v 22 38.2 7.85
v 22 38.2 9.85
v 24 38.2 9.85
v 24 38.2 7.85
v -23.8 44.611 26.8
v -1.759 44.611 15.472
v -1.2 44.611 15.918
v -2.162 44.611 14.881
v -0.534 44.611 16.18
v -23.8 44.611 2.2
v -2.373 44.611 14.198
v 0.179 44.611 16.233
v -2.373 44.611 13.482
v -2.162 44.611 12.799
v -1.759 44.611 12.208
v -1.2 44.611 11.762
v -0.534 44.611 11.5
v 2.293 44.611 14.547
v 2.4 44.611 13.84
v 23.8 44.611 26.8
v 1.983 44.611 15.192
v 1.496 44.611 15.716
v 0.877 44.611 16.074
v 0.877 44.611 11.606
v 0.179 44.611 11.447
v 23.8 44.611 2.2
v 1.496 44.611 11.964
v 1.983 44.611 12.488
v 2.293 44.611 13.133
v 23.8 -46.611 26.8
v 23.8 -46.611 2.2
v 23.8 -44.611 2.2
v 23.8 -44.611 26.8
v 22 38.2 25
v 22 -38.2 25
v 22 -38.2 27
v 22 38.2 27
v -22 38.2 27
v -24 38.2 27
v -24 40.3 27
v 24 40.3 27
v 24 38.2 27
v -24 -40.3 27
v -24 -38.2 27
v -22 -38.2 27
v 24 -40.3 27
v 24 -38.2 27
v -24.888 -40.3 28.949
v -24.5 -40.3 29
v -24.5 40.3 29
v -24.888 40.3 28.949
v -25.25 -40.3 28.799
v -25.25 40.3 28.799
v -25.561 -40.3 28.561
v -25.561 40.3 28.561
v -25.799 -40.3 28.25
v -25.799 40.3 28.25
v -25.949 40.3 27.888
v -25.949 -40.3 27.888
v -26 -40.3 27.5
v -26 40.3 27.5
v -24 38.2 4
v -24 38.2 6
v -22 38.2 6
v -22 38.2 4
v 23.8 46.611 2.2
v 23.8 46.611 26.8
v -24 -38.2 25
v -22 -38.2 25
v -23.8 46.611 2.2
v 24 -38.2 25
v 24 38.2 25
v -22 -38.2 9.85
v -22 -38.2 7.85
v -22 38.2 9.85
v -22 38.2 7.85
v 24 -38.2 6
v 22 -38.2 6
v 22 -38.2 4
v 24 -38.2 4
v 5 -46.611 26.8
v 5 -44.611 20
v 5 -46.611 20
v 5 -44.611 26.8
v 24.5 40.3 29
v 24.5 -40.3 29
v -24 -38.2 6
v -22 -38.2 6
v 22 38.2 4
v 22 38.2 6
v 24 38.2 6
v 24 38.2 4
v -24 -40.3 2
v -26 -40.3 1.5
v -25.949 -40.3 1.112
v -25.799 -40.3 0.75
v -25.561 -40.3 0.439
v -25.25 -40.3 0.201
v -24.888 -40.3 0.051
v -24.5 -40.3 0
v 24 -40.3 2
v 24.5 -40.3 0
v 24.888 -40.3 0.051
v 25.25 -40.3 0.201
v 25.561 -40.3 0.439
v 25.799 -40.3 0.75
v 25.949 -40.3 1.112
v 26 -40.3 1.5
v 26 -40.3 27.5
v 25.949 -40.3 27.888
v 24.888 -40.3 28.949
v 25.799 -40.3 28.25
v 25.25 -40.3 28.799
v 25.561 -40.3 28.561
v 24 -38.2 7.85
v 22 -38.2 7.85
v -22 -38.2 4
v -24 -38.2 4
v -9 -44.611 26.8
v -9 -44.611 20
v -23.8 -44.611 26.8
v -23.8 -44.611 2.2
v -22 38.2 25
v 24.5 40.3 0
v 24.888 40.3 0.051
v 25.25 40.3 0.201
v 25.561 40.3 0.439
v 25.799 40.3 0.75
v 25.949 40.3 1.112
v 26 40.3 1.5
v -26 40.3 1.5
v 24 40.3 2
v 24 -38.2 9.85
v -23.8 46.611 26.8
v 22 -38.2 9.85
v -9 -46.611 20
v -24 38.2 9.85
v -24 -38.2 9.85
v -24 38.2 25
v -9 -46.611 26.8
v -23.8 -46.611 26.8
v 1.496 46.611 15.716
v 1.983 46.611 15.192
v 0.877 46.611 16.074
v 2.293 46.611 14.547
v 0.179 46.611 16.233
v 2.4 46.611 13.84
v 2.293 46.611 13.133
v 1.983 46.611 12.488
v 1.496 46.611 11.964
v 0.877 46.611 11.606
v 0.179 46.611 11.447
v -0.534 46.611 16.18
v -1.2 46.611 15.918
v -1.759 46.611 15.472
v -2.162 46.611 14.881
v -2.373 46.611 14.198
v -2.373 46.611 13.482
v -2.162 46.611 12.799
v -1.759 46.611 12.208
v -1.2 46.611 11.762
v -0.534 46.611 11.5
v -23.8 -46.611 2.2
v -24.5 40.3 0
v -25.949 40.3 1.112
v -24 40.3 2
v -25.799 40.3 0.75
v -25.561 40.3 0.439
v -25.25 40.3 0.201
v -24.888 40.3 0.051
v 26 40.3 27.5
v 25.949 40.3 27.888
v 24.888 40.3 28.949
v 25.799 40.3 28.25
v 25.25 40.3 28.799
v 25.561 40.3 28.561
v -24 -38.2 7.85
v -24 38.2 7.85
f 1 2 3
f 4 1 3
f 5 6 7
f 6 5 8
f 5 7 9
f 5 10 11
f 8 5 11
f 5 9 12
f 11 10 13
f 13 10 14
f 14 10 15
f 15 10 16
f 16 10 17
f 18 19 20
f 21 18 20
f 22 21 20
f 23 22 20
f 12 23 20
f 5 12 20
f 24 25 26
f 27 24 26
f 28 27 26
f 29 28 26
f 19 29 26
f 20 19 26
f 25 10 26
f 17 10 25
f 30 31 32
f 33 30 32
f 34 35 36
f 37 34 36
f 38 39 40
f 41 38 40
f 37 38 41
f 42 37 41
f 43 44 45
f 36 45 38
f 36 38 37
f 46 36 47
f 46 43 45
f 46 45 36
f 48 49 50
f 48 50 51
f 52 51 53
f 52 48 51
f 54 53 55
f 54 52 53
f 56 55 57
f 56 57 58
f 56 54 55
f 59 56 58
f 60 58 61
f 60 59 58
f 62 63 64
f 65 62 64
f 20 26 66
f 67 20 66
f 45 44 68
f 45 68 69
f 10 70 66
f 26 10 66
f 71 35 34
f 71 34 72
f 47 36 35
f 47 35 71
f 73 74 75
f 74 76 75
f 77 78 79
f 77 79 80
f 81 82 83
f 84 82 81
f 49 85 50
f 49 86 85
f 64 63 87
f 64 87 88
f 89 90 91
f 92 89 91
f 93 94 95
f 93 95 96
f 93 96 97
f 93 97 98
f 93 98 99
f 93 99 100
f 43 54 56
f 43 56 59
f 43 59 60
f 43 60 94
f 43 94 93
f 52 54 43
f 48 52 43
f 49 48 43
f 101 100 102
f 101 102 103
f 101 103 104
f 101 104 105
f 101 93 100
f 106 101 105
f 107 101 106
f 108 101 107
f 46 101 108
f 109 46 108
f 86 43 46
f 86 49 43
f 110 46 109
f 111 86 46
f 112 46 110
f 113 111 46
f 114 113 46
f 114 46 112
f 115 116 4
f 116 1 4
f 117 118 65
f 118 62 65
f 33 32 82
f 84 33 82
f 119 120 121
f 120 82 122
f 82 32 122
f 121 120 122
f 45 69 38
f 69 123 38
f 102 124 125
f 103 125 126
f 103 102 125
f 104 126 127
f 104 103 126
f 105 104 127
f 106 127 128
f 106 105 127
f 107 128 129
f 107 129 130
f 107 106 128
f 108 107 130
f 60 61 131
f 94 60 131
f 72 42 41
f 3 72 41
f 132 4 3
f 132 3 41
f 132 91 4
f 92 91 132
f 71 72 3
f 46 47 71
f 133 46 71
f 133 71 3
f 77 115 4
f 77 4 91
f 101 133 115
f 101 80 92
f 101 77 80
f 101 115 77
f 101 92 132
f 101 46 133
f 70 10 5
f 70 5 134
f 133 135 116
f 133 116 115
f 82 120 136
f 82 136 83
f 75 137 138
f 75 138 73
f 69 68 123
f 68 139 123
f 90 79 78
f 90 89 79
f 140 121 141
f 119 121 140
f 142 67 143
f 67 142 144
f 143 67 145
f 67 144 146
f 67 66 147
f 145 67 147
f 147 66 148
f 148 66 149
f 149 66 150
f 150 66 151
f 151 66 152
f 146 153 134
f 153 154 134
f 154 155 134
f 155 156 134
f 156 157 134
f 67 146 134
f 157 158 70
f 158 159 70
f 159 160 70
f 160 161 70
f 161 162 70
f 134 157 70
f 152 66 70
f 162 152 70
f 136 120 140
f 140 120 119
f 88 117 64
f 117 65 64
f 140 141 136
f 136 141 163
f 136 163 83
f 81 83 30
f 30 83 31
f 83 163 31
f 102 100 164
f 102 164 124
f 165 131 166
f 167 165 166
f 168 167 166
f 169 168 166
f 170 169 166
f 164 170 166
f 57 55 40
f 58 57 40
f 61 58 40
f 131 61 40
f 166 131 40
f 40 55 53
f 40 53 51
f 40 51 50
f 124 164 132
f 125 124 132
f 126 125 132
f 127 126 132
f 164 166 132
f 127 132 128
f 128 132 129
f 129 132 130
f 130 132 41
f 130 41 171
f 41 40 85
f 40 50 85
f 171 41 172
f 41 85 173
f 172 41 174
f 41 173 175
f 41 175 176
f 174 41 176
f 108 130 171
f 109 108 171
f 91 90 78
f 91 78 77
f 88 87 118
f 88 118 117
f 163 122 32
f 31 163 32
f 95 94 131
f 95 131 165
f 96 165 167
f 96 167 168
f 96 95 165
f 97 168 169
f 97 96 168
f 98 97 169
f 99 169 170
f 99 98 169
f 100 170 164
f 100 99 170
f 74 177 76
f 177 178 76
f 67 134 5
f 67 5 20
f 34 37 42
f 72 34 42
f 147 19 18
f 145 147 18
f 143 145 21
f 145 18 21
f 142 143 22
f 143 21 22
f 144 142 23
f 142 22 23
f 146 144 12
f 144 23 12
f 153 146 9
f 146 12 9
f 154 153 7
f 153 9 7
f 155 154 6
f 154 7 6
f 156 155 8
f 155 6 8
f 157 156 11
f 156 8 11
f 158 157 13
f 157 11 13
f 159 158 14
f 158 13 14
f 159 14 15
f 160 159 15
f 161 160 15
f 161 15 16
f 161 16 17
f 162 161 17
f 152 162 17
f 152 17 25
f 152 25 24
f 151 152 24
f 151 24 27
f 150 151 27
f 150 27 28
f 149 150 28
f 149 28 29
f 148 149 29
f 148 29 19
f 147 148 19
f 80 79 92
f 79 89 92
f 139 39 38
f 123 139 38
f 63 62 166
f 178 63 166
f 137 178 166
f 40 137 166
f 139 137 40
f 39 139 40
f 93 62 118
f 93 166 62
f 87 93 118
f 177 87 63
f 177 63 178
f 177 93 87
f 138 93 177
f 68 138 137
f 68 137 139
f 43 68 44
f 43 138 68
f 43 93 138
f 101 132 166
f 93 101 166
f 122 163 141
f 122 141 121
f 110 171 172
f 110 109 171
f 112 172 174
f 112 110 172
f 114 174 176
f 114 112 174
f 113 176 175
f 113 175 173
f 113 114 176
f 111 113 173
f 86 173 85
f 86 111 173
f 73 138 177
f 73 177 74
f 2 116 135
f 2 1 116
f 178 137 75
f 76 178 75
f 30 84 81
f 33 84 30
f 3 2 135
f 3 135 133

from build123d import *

# Parameters (mm, degrees)
F1_DEPTH = 40.3
F0_W     = 2
F0_H     = 2
F2_DEPTH = 38.2
F4_START = 2.2
F3_W     = 23.8
F3_H     = 2
F4_DEPTH = 24.6
F5_W     = 14
F5_H     = 6.9
F6_DEPTH = 46.8
F7_START = 2.2
F7_DEPTH = 24.6
F8_R     = 2.4
F9_DEPTH = 48


with BuildPart() as f1:
    # F0 (on Front) → F1 (new body, symmetric)
    with BuildSketch(Plane.XZ):
        with BuildLine():
            Line((24.5, 29), (-24.5, 29))
            ThreePointArc((-24.5, 29), (-25.5606601718, 28.5606601718), (-26, 27.5))
            Line((-26, 27.5), (-26, 1.5))
            ThreePointArc((-26, 1.5), (-25.5606601718, 0.4393398282), (-24.5, 0))
            Line((-24.5, 0), (24.5, 0))
            ThreePointArc((24.5, 0), (25.5606601718, 0.4393398282), (26, 1.5))
            Line((26, 1.5), (26, 27.5))
            ThreePointArc((26, 27.5), (25.5606601718, 28.5606601718), (24.5, 29))
        make_face()
        Polygon((-24, 25), (-24, 27), (-22, 27), (22, 27), (24, 27), (24, 25), (24, 9.85), (24, 7.85), (24, 6), (24, 4), (24, 2), (-24, 2), (-24, 4), (-24, 6), (-24, 7.85), (-24, 9.85), align=None, mode=Mode.SUBTRACT)
    extrude(amount=F1_DEPTH, both=True)

    # F0 (on Front) → F2 (join, symmetric)
    with BuildSketch(Plane.XZ):
        with Locations((-23, 8.85)):
            Rectangle(F0_W, F0_H)
        with Locations((-23, 5)):
            Rectangle(F0_W, F0_H)
        with Locations((23, 8.85)):
            Rectangle(F0_W, F0_H)
        with Locations((23, 5)):
            Rectangle(F0_W, F0_H)
        with Locations((-23, 26)):
            Rectangle(F0_W, F0_H)
        with Locations((23, 26)):
            Rectangle(F0_W, F0_H)
    extrude(amount=F2_DEPTH, both=True)


with BuildPart() as f4:
    # F3 (on Top) → F4 (new body)
    with BuildSketch(Plane.XY.offset(F4_START)):
        with Locations((-11.9, -45.6112829745)):
            Rectangle(F3_W, F3_H)
        with Locations((11.9, -45.6112829745)):
            Rectangle(F3_W, F3_H)
    extrude(amount=F4_DEPTH)

    # F5 (on Front) → F6 (cut)
    with BuildSketch(Plane.XZ):
        with Locations((-2, 23.45)):
            Rectangle(F5_W, F5_H)
    extrude(amount=F6_DEPTH, mode=Mode.SUBTRACT)


with BuildPart() as f7:
    # F3 (on Top) → F7 (new body)
    with BuildSketch(Plane.XY.offset(F7_START)):
        with Locations((-11.9, 45.6112829745)):
            Rectangle(F3_W, F3_H)
        with Locations((11.9, 45.6112829745)):
            Rectangle(F3_W, F3_H)
    extrude(amount=F7_DEPTH)

    # F8 (on Front) → F9 (cut)
    with BuildSketch(Plane.XZ):
        with Locations((0, 13.84)):
            Circle(F8_R)
    extrude(amount=-F9_DEPTH, mode=Mode.SUBTRACT)


solid = Compound([f1.part, f4.part, f7.part])
